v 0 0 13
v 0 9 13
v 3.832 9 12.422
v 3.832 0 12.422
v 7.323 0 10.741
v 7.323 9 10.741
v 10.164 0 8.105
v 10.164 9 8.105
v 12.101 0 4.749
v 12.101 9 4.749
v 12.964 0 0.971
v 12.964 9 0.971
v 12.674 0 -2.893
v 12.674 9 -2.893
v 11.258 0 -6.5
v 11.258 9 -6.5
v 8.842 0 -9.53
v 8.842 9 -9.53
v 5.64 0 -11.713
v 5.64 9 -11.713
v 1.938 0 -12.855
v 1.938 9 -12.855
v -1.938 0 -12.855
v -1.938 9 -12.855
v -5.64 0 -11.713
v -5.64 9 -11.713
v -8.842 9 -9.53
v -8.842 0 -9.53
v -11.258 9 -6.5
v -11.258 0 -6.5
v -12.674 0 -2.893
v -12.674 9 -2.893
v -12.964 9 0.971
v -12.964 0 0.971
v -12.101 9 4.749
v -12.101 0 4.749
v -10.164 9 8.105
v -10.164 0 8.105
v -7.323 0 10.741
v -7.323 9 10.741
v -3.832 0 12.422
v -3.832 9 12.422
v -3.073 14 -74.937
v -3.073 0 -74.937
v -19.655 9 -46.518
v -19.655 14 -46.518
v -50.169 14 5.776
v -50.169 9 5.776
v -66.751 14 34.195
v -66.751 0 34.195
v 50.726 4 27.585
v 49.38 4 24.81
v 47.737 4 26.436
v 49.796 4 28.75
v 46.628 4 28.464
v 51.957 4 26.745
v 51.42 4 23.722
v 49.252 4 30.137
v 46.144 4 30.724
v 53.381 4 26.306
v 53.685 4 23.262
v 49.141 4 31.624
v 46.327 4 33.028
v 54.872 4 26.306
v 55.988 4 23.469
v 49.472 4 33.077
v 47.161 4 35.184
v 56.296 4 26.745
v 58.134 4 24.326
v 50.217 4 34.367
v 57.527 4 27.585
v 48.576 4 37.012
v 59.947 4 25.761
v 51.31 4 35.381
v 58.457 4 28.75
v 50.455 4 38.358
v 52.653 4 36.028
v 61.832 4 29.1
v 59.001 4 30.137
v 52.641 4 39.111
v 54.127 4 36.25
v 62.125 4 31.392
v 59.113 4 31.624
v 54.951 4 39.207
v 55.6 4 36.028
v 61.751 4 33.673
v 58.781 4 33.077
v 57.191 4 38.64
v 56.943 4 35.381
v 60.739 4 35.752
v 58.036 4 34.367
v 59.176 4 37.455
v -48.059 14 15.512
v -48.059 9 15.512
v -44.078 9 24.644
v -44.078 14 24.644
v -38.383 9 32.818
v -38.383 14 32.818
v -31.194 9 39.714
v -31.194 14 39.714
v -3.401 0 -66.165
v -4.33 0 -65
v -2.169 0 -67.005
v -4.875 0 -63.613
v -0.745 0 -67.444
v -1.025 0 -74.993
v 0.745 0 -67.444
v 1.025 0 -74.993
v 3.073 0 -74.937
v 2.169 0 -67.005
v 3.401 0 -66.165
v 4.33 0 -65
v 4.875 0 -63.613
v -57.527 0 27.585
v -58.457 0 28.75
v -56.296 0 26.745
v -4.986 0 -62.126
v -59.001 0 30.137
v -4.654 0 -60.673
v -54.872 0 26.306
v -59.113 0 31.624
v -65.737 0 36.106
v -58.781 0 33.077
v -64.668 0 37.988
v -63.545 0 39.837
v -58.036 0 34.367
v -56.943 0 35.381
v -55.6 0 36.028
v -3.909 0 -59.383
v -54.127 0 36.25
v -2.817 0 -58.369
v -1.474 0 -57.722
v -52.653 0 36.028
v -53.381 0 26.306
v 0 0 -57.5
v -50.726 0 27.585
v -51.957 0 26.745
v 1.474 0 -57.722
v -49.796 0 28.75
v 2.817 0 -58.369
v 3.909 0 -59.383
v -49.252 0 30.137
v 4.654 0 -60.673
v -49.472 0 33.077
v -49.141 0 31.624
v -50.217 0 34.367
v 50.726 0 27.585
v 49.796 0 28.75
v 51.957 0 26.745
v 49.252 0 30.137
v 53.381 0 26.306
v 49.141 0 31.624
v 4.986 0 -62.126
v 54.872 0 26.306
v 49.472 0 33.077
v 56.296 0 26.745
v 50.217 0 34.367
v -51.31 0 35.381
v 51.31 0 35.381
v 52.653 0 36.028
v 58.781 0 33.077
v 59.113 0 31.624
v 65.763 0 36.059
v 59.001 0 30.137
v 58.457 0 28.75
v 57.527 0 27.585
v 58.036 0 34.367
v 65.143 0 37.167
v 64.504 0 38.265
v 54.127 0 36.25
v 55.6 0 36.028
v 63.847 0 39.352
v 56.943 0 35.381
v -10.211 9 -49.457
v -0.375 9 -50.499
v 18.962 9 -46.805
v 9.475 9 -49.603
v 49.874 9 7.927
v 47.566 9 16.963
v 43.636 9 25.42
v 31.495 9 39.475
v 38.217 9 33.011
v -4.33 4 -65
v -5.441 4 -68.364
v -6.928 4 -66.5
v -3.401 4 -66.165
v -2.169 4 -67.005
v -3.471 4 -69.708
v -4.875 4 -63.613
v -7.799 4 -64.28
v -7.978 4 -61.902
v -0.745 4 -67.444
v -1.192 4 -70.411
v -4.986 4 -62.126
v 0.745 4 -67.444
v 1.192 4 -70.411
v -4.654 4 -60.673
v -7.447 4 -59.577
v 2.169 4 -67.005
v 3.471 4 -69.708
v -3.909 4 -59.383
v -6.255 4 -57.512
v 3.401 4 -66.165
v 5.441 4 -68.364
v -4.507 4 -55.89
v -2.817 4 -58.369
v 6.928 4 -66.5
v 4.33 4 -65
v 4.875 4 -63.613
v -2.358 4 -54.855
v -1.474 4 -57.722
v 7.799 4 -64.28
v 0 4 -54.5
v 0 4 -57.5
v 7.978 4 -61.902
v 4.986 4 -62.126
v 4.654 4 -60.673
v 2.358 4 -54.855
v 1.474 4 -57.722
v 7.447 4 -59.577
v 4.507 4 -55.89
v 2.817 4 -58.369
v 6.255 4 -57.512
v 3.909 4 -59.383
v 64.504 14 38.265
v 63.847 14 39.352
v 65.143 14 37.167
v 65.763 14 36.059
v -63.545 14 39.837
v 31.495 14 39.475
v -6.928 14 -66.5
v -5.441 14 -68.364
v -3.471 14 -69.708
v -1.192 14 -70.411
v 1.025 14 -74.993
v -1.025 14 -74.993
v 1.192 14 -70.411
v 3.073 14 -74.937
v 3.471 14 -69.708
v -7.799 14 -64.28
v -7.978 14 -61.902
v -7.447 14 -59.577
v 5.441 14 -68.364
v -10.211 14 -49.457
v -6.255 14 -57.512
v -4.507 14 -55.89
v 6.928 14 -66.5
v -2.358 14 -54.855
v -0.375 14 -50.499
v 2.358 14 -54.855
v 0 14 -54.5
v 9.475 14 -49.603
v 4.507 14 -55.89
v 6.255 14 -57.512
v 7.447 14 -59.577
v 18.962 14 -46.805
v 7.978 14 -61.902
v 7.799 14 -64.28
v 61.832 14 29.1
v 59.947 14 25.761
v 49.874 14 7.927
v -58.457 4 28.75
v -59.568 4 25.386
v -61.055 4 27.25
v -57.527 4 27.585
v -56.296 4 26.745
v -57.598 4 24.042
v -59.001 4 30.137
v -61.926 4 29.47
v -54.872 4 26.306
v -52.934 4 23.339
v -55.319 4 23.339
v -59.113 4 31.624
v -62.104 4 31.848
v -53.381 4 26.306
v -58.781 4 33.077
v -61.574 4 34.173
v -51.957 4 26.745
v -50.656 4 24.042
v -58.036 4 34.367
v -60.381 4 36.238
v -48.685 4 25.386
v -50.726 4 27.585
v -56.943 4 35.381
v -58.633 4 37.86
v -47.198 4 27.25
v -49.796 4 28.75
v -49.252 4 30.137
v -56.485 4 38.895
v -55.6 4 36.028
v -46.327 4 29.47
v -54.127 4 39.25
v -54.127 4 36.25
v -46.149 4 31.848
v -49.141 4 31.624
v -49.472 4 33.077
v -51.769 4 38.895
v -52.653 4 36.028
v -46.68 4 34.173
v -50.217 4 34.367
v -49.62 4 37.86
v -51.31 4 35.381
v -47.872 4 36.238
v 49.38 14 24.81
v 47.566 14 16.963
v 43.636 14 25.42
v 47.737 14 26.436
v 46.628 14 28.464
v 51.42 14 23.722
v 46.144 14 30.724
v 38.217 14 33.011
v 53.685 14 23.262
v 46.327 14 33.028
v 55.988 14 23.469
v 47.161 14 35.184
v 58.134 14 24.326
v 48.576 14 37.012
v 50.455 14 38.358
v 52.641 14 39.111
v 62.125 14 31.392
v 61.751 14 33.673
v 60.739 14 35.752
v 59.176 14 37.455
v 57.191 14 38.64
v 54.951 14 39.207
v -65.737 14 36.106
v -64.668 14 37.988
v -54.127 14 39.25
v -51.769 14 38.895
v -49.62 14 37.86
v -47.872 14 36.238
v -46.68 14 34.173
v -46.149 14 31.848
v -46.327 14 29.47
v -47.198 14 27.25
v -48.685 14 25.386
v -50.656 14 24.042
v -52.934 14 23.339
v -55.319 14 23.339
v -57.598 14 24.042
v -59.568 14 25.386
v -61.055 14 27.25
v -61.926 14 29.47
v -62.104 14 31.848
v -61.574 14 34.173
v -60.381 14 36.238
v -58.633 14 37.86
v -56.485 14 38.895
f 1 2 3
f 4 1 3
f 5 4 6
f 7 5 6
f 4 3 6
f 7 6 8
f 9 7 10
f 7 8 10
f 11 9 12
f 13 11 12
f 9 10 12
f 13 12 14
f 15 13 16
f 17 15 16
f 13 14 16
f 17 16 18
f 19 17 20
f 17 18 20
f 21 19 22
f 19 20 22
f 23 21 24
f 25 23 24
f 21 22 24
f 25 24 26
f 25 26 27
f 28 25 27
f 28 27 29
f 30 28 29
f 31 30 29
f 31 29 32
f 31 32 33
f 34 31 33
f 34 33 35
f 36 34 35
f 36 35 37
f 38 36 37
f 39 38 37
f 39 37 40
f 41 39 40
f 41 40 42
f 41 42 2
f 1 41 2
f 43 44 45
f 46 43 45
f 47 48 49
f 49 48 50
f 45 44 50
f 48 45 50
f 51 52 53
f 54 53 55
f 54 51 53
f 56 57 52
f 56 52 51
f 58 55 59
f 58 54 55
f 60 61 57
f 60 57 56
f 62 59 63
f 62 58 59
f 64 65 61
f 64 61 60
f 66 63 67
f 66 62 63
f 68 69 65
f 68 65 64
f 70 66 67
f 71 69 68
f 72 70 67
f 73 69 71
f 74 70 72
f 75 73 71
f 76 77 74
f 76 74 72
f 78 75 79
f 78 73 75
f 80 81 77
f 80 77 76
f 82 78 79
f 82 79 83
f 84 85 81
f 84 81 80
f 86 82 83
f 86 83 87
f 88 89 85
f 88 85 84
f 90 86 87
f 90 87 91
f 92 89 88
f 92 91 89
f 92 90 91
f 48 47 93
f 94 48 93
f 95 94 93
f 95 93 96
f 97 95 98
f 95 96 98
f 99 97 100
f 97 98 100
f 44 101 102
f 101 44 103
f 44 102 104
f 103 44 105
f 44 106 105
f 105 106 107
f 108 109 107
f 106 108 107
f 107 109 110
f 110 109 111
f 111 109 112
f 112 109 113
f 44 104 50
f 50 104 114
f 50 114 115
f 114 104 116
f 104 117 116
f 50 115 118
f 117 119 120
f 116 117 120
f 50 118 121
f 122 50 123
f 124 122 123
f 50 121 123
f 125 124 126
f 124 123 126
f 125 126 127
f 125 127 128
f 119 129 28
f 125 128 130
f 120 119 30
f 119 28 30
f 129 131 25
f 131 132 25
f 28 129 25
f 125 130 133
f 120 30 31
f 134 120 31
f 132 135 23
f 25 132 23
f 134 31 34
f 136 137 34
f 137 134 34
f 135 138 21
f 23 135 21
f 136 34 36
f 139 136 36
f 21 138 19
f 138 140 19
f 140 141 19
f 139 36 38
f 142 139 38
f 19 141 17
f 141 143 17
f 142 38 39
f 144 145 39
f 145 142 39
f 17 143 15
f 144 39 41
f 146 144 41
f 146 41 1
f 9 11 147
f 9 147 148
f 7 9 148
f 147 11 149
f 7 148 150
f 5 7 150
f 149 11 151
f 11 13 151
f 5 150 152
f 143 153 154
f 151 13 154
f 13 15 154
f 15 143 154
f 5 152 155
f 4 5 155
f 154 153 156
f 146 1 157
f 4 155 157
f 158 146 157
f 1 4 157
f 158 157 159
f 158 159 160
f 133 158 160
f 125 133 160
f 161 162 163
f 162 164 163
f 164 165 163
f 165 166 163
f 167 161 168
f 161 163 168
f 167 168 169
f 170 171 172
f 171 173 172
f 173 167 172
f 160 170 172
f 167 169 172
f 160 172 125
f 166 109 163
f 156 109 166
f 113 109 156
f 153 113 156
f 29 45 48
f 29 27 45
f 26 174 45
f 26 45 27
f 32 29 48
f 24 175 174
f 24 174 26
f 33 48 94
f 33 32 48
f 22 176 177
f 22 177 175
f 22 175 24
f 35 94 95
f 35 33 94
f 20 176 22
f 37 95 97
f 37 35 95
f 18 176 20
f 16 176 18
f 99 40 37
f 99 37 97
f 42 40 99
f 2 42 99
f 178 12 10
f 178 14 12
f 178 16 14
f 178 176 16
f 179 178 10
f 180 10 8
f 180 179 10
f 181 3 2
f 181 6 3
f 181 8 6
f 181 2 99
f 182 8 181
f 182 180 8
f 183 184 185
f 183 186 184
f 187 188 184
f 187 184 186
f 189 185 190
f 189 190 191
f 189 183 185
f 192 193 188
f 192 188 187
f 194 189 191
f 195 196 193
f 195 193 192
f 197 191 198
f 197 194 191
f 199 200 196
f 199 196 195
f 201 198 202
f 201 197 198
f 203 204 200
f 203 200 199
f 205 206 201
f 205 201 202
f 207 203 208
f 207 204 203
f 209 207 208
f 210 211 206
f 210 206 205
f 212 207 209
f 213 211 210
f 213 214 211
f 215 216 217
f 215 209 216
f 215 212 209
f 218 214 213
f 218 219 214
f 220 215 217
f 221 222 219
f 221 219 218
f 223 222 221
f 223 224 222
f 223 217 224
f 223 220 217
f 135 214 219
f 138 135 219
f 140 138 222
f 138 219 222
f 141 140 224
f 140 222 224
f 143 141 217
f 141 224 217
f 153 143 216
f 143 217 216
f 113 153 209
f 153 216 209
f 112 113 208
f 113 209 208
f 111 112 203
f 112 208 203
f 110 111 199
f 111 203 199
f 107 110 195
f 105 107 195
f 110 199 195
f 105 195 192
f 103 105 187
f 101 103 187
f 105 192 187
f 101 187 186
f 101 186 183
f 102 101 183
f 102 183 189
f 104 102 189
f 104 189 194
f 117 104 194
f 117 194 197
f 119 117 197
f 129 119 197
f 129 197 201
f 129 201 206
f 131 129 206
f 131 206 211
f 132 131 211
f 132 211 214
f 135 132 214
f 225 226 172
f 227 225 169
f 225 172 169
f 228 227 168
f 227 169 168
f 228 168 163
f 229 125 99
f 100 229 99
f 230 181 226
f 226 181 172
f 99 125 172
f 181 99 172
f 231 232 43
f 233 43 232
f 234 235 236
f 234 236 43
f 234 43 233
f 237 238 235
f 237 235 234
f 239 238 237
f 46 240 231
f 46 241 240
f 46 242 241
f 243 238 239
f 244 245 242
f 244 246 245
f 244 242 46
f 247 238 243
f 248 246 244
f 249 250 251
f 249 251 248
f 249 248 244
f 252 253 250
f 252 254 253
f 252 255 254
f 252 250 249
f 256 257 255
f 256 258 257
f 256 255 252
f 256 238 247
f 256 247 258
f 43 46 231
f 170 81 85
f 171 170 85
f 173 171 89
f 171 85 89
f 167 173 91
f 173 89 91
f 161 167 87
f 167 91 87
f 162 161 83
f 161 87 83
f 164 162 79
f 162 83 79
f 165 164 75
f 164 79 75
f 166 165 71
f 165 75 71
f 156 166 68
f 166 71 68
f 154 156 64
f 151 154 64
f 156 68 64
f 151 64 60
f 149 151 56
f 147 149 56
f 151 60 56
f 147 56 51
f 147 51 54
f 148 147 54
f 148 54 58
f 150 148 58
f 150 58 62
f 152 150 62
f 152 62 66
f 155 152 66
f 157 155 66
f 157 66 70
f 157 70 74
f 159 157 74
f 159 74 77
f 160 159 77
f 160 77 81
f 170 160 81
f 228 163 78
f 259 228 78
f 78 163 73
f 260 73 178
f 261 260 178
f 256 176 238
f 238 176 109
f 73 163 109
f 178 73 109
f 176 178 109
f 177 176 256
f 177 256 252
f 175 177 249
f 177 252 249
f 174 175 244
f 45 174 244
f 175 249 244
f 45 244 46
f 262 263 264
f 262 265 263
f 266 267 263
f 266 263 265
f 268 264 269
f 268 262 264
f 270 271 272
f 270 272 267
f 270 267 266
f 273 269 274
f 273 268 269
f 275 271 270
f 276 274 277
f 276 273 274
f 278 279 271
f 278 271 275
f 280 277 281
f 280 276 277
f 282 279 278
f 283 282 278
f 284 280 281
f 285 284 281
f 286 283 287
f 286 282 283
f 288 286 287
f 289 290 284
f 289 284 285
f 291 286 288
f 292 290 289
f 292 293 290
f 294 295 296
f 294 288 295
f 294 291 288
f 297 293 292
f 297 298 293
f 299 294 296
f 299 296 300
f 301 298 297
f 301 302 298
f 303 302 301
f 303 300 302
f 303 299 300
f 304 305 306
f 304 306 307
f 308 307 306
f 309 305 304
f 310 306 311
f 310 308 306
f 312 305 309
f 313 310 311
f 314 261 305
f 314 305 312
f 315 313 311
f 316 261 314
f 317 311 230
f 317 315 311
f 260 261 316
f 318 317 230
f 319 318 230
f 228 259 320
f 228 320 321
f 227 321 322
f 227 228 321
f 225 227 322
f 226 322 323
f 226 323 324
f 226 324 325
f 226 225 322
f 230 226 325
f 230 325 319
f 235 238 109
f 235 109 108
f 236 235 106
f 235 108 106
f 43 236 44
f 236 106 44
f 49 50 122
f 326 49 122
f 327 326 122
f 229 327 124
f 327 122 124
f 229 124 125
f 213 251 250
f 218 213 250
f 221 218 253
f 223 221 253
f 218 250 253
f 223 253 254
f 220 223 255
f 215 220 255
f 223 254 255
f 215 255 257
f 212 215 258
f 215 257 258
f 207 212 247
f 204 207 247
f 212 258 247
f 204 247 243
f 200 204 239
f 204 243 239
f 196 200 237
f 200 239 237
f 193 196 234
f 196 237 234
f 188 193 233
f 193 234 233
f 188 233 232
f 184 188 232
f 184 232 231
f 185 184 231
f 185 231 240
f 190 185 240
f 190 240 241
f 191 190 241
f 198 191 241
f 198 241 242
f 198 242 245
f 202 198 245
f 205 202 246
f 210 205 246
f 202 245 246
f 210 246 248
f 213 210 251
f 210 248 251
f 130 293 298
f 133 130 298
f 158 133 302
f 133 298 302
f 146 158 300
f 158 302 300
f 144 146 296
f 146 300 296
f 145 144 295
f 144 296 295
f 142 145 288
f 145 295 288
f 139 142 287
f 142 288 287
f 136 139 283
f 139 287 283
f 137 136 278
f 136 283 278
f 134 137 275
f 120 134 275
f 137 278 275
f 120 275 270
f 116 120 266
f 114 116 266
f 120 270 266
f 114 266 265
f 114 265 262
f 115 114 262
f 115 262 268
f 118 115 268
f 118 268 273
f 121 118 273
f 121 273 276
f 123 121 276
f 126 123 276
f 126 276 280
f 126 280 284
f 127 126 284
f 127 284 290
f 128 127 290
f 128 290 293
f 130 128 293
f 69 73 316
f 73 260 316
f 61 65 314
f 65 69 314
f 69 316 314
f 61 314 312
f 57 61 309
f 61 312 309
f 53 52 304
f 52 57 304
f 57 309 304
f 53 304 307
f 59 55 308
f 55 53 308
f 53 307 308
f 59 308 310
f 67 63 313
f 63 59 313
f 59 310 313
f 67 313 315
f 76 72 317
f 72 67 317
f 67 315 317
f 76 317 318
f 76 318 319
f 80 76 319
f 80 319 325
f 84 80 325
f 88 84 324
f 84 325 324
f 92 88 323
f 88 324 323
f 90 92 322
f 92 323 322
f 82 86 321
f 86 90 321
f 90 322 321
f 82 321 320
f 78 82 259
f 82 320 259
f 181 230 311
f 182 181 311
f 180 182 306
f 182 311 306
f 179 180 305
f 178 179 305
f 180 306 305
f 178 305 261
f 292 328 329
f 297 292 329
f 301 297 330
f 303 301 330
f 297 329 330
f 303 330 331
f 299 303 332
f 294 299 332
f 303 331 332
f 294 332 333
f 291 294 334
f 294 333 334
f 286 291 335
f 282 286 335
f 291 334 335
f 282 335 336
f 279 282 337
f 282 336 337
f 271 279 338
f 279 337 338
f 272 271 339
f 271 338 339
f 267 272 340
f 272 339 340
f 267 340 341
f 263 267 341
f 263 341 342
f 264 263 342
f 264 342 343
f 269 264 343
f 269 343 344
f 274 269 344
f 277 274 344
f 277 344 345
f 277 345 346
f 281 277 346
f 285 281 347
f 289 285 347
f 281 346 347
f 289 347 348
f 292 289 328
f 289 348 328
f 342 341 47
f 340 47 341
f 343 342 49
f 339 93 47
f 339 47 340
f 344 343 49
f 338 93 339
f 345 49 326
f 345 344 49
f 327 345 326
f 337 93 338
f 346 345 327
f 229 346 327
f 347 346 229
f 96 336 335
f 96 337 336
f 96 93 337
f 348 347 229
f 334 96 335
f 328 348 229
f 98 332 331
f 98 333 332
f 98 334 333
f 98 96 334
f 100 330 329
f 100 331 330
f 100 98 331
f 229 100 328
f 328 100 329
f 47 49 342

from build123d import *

# Parameters (mm, degrees)
SKETCH1_R           = 75
BOSS_EXTRUDE1_DEPTH = 14
SKETCH4_R           = 5
CUT_EXTRUDE4_DEPTH  = 107.98598039
SKETCH2_R           = 13
CUT_EXTRUDE5_DEPTH  = 107.98598039
SKETCH5_R           = 50.5
CUT_EXTRUDE6_DEPTH  = 5
SKETCH6_R           = 8
CUT_EXTRUDE7_DEPTH  = 10
CUT_EXTRUDE8_DEPTH  = 17


with BuildPart() as part:
    # Sketch1 → Boss-Extrude1 (new body)
    with BuildSketch(Plane(origin=(0, 0, 0), x_dir=(1, 0, 0), z_dir=(0, 1, 0))):
        with Locations(Location((0, 0, 0), (0, 0, 270))):
            Circle(SKETCH1_R)
    extrude(amount=BOSS_EXTRUDE1_DEPTH)

    # Sketch4 → Cut-Extrude4 (cut, through all)
    with BuildSketch(Plane(origin=(0, 14, 0), x_dir=(1, 0, 0), z_dir=(0, 1, 0))):
        with Locations(Location((0, 62.5, 0), (0, 0, 270))):
            Circle(SKETCH4_R)
        with Locations(Location((-54.126587737, -31.25, 0), (0, 0, 270))):
            Circle(SKETCH4_R)
        with Locations(Location((54.126587737, -31.25, 0), (0, 0, 270))):
            Circle(SKETCH4_R)
    extrude(amount=-CUT_EXTRUDE4_DEPTH, mode=Mode.SUBTRACT)

    # Sketch2 → Cut-Extrude5 (cut, through all)
    with BuildSketch(Plane(origin=(0, 14, 0), x_dir=(1, 0, 0), z_dir=(0, 1, 0))):
        with Locations(Location((0, 0, 0), (0, 0, 270))):
            Circle(SKETCH2_R)
    extrude(amount=-CUT_EXTRUDE5_DEPTH, mode=Mode.SUBTRACT)

    # Sketch5 → Cut-Extrude6 (cut)
    with BuildSketch(Plane(origin=(0, 14, 0), x_dir=(-1, 0, 0), z_dir=(0, 1, 0))):
        with Locations(Location((0, 0, 0), (0, 0, 90))):
            Circle(SKETCH5_R)
    extrude(amount=-CUT_EXTRUDE6_DEPTH, mode=Mode.SUBTRACT)

    # Sketch6 → Cut-Extrude7 (cut)
    with BuildSketch(Plane(origin=(0, 14, 0), x_dir=(1, 0, 0), z_dir=(0, 1, 0))):
        with Locations(Location((-54.126587737, -31.25, 0), (0, 0, 270))):
            Circle(SKETCH6_R)
        with Locations(Location((0, 62.5, 0), (0, 0, 270))):
            Circle(SKETCH6_R)
        with Locations(Location((54.126587737, -31.25, 0), (0, 0, 270))):
            Circle(SKETCH6_R)
    extrude(amount=-CUT_EXTRUDE7_DEPTH, mode=Mode.SUBTRACT)

    # Sketch7 → Cut-Extrude8 (cut)
    with BuildSketch(Plane(origin=(0, 0, 0), x_dir=(-1, 0, 0), z_dir=(0, -1, 0))):
        with BuildLine():
            ThreePointArc((75, 0), (54.10858072, 51.935166241), (3.073026868, 74.937016927))
            Line((3.073026868, 74.937016927), (66.751084117, -34.194923151))
            ThreePointArc((66.751084117, -34.194923151), (72.908611661, -17.587903389), (75, 0))
        make_face()
        with BuildLine():
            ThreePointArc((-63.846861253, -39.351979723), (-0.285812655, -74.999455406), (63.545081168, -39.837452972))
            Line((63.545081168, -39.837452972), (-63.846861253, -39.351979723))
        make_face()
        with BuildLine():
            Line((-65.762802754, -36.059031794), (-3.073026868, 74.937016927))
            ThreePointArc((-3.073026868, 74.937016927), (-65.304085384, 36.883281201), (-65.762802754, -36.059031794))
        make_face()
    extrude(amount=-CUT_EXTRUDE8_DEPTH, mode=Mode.SUBTRACT)


solid = part.part
